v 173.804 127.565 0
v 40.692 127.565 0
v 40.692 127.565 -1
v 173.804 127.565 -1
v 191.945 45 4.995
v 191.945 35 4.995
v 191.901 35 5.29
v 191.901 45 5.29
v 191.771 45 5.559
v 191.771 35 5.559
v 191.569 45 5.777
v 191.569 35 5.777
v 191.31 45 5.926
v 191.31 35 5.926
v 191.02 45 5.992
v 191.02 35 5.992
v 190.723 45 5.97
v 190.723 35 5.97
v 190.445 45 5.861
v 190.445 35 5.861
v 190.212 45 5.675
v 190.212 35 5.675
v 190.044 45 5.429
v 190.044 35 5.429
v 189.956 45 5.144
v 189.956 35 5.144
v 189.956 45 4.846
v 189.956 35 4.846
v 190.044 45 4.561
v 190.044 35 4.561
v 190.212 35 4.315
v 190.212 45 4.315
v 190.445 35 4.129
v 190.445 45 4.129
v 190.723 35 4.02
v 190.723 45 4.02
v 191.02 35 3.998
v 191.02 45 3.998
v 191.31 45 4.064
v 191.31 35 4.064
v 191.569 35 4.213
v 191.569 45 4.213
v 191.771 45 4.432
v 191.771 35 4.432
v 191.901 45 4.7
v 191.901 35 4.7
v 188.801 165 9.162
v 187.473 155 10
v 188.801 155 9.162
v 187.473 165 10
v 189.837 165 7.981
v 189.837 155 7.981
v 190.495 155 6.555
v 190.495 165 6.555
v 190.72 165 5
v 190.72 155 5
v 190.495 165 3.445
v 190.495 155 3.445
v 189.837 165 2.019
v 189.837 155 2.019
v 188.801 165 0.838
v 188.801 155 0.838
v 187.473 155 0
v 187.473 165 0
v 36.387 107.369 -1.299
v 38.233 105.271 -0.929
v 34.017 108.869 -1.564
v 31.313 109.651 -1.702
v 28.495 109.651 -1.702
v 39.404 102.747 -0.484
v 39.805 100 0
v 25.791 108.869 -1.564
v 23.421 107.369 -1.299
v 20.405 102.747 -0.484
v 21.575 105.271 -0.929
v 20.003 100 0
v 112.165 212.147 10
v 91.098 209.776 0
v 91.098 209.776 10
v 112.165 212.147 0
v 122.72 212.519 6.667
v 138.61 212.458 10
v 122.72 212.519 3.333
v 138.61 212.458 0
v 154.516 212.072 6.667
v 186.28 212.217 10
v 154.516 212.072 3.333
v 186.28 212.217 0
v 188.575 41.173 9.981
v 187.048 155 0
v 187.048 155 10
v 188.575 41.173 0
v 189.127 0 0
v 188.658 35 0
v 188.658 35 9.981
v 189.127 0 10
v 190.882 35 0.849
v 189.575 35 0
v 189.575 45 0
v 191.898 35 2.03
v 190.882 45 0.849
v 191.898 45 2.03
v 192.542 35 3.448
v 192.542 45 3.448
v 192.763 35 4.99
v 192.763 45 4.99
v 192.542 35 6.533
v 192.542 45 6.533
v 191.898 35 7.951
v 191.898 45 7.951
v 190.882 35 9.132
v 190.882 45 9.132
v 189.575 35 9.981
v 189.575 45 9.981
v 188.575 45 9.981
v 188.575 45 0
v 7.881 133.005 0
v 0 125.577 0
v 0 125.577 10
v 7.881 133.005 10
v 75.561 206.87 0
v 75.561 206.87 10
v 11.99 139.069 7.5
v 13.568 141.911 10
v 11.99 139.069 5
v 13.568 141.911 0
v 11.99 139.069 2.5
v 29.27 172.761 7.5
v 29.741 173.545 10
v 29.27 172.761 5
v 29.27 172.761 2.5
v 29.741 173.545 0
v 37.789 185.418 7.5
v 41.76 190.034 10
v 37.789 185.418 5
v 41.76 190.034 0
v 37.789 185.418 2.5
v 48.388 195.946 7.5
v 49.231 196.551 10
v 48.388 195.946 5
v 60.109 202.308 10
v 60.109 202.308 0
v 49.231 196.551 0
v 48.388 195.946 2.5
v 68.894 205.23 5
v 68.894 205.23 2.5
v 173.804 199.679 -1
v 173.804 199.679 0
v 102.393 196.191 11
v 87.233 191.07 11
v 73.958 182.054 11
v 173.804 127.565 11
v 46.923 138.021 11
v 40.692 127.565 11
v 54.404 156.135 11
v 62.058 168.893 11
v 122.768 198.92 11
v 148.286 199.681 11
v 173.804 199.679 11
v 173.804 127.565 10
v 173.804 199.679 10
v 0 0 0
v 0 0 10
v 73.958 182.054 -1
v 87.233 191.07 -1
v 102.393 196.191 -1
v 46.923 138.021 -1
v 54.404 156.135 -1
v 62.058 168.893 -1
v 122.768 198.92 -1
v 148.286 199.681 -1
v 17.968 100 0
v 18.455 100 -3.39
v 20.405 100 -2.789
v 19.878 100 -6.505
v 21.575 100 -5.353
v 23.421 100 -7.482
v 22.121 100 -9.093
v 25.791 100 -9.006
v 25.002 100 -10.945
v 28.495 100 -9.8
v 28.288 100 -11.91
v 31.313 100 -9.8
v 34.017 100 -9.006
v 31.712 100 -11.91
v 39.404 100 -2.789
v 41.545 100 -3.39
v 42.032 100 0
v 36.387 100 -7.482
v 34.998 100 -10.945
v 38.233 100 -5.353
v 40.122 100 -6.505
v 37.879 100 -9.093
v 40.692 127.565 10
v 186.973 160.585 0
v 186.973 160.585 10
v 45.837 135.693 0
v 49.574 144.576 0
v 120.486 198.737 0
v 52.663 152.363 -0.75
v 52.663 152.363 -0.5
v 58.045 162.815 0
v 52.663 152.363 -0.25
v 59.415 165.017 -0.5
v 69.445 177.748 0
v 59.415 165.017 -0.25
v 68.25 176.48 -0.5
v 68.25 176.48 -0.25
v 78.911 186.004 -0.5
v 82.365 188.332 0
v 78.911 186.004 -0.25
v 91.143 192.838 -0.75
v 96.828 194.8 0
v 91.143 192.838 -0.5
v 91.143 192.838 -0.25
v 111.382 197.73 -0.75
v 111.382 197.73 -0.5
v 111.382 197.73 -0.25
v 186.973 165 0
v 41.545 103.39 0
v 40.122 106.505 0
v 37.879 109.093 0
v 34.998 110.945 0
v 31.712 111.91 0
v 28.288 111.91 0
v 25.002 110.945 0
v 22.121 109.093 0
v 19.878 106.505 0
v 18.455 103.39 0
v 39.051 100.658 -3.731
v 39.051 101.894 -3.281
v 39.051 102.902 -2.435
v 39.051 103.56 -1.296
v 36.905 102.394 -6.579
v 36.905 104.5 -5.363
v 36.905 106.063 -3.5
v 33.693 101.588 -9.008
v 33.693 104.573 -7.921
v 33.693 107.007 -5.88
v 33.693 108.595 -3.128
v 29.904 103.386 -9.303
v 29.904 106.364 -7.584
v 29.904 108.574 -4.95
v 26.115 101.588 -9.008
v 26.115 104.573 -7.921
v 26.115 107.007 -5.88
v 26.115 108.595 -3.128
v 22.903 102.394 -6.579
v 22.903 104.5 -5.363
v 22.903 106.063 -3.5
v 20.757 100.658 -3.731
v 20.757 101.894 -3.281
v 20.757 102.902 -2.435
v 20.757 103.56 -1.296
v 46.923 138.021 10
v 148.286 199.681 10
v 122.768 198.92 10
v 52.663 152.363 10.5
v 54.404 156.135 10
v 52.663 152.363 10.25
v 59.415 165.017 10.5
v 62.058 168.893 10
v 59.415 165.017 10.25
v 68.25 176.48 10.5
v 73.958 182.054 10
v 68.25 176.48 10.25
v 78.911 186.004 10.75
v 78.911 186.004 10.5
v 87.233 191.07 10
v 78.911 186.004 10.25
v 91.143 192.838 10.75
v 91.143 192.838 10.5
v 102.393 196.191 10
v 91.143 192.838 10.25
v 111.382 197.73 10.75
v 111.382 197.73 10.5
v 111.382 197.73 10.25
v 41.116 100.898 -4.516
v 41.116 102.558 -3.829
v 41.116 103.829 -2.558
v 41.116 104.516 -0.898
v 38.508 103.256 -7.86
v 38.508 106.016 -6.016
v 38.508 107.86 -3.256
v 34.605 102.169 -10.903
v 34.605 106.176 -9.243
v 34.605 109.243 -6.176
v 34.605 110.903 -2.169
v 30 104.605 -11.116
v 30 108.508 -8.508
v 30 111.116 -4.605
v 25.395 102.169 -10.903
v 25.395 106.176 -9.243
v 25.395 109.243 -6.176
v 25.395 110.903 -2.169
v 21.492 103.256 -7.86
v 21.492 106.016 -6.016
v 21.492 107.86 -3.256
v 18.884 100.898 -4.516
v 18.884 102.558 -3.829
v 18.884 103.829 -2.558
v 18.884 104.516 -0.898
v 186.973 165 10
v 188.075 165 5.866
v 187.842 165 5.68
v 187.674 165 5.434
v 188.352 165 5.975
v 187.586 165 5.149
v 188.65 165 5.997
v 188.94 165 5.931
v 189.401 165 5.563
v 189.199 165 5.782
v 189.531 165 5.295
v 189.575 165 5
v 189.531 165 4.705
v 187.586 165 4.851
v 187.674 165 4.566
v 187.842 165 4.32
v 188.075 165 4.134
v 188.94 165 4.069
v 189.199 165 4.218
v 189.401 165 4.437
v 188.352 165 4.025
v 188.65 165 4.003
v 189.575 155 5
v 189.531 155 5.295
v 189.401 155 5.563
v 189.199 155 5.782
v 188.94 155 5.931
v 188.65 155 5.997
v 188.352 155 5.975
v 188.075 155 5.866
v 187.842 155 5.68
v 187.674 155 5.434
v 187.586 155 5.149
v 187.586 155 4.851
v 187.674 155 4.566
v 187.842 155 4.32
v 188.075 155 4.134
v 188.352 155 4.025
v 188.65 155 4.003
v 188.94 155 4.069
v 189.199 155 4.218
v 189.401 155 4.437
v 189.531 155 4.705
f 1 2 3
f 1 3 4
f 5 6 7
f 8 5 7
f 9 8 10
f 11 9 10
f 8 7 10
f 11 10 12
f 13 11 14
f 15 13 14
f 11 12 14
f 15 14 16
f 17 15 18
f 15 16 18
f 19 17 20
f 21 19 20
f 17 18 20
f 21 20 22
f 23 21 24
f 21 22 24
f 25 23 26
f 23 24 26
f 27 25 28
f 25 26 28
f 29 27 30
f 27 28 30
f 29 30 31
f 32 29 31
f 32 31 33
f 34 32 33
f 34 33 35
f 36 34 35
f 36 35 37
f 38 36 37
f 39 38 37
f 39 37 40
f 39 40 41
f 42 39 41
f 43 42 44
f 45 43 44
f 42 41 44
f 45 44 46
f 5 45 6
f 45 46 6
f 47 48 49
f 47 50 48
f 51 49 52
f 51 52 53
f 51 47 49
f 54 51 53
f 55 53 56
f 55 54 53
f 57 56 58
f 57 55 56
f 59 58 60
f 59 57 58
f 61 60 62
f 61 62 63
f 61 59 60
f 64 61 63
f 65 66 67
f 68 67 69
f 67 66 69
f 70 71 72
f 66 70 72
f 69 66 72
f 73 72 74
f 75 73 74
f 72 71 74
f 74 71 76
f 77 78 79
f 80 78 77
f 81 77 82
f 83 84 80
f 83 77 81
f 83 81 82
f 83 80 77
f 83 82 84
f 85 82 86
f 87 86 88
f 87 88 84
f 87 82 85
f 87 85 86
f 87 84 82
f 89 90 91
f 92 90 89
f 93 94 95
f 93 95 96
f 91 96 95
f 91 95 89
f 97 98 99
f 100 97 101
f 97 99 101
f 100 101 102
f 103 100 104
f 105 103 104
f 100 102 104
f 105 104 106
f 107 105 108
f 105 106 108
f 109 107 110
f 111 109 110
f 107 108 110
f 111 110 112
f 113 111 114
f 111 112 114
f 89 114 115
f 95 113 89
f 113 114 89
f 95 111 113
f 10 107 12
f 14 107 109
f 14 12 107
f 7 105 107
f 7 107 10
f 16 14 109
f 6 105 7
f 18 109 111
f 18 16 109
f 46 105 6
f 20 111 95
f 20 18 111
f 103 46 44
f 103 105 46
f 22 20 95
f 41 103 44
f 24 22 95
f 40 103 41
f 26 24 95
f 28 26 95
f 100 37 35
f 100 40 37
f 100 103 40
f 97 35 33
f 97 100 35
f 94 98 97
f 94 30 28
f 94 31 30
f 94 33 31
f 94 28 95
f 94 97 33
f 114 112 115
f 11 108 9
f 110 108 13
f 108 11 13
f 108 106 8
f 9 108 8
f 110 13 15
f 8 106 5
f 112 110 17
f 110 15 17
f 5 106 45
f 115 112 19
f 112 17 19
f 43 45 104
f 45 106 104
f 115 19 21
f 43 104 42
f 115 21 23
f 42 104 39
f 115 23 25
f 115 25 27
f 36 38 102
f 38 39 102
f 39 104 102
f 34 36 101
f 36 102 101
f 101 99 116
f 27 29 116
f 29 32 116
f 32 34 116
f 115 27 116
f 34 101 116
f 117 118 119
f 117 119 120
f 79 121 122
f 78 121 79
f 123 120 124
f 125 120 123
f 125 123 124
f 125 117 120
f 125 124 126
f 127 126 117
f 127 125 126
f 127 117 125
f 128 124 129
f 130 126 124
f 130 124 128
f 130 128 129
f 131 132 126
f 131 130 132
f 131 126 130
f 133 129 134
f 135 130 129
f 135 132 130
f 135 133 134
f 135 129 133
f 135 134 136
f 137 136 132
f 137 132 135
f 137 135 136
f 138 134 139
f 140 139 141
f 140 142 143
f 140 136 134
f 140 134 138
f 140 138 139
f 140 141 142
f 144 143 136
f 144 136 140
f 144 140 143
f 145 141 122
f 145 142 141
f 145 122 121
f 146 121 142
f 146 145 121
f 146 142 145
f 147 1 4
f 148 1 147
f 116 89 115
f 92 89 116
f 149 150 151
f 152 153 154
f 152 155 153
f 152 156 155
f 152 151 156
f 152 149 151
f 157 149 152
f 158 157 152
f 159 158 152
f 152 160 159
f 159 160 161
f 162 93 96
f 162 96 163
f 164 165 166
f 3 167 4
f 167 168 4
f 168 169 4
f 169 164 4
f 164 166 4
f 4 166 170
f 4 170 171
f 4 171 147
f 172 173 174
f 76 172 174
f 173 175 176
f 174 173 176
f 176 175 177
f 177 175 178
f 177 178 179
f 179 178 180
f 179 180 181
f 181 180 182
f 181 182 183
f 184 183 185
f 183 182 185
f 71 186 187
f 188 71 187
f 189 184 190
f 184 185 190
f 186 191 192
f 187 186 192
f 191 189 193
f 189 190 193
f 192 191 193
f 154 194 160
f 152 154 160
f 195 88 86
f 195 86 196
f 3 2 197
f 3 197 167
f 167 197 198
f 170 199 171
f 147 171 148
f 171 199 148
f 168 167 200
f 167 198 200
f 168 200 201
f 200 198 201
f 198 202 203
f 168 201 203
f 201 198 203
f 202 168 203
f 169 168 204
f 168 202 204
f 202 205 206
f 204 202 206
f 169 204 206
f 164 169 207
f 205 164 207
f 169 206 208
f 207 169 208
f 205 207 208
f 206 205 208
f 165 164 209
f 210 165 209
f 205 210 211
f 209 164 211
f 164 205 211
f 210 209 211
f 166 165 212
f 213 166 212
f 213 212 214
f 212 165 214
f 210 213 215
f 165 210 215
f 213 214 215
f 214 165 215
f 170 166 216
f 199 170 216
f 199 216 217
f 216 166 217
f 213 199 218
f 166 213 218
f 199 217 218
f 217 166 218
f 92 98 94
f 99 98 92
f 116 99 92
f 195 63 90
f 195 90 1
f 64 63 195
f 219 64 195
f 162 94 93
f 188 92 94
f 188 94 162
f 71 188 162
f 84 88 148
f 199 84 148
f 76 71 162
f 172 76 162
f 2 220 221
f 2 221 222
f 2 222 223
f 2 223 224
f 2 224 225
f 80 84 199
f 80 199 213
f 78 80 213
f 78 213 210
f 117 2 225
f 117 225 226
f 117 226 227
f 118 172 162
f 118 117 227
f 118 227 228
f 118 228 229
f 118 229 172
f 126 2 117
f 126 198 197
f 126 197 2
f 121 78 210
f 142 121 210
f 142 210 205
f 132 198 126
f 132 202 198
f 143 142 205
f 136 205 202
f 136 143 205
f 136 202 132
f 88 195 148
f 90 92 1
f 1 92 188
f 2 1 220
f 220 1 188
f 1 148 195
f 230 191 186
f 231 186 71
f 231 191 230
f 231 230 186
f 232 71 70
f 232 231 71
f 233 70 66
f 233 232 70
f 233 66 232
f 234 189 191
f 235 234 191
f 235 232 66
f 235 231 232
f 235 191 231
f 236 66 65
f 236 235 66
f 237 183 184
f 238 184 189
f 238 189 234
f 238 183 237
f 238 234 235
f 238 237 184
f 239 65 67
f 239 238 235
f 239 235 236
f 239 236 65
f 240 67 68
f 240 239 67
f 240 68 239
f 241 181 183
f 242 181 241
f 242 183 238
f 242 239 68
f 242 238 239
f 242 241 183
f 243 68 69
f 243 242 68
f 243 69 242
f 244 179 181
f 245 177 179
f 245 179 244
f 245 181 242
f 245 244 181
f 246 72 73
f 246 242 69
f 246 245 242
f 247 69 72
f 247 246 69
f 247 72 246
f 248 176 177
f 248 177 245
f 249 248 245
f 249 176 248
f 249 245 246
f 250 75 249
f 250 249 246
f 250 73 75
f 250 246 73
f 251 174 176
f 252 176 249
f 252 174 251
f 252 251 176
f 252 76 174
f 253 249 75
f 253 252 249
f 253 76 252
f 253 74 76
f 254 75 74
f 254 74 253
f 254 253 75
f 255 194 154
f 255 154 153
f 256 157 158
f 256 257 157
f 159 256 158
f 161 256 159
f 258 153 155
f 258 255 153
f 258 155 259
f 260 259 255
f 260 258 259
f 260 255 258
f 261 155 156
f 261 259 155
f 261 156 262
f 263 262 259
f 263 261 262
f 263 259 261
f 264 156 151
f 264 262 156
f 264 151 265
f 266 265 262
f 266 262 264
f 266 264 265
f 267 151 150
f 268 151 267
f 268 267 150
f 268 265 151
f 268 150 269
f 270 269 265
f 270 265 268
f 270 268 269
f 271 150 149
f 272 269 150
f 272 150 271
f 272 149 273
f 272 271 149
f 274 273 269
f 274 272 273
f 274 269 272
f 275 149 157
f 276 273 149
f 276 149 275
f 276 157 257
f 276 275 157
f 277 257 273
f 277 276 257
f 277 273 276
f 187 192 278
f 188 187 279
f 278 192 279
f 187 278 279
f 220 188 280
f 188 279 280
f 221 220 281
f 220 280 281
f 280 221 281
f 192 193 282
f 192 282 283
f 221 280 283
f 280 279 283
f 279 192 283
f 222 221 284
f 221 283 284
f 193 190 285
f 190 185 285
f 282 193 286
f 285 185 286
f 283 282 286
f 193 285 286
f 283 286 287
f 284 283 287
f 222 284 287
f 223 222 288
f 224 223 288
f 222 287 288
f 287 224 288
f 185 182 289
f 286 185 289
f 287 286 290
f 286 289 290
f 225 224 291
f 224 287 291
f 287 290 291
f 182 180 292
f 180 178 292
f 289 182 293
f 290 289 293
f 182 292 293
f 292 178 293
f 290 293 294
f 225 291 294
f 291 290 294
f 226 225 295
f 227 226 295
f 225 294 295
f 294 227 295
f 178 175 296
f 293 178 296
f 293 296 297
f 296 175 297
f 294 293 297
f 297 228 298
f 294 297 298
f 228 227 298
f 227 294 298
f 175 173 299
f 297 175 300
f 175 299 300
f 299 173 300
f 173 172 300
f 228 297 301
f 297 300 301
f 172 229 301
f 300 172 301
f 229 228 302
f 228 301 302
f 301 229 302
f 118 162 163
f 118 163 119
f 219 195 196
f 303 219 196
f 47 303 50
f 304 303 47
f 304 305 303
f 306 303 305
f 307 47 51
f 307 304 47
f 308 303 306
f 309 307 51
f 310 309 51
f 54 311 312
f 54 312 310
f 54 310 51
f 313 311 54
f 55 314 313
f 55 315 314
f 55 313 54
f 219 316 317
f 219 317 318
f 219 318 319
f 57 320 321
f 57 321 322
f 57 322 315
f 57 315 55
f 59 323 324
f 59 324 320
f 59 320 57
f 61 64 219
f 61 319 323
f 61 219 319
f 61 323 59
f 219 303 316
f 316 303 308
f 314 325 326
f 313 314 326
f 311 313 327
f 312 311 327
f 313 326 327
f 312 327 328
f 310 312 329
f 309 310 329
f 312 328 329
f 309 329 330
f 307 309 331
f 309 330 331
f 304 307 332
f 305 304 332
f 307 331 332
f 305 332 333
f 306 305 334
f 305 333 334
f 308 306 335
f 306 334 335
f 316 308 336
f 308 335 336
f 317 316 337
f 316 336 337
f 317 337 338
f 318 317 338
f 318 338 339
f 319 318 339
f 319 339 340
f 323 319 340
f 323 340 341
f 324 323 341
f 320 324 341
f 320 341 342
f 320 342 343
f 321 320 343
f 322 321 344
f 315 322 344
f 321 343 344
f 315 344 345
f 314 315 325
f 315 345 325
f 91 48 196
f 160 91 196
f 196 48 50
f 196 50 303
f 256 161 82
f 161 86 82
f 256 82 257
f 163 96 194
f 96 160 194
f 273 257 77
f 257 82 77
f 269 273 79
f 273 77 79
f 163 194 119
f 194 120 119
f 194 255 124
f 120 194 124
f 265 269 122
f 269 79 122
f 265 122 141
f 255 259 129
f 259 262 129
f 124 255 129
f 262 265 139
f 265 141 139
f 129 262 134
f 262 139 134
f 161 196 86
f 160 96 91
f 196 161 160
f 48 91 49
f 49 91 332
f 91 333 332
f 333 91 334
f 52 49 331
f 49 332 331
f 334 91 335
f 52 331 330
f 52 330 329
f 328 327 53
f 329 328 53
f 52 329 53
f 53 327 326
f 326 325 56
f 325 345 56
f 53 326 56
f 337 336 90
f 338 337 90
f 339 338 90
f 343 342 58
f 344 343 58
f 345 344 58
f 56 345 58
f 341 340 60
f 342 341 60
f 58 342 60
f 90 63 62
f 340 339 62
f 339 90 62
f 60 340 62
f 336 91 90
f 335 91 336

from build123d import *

# Parameters (mm, degrees)
BOSS_EXTRUDE1_DEPTH      = 10
BOSS_EXTRUDE2_DEPTH      = 1
BOSS_EXTRUDE2_DEPTH_BACK = 11
BOSS_EXTRUDE3_DEPTH      = 5
BOSS_EXTRUDE3_DEPTH_BACK = 5
BOSS_EXTRUDE4_DEPTH      = 5
BOSS_EXTRUDE4_DEPTH_BACK = 5
SKETCH19_R               = 1
CUT_EXTRUDE3_DEPTH       = 10
SKETCH24_R               = 1
CUT_EXTRUDE4_DEPTH       = 10
REVOLVE2_ANGLE           = 90
CUT_REVOLVE4_ANGLE       = 80


with BuildPart() as part:
    # Sketch1 → Boss-Extrude1 (new body)
    with BuildSketch(Plane.XY):
        with BuildLine():
            Line((186.280110435, 212.216863761), (189.127439812, 0))
            Line((189.127439812, 0), (0, 0))
            Line((0, 0), (0, 125.576698411))
            add(Edge.make_bspline(
                [(0, 125.576698411), (10.557001905, 132.837635912), (17.098165485, 150.751131911), (30.538510921, 175.76338894), (49.352217031, 203.04075133), (76.867896029, 207.296992896), (91.097956951, 209.776295723)],
                knots=[0, 0, 0, 0, 0.275246051, 0.426571591, 0.655828837, 1, 1, 1, 1], degree=3))
            add(Edge.make_bspline(
                [(91.097956951, 209.776295723), (122.565116695, 215.374757588), (154.60100966, 210.515513687), (186.280110435, 212.216863761)],
                knots=[0, 0, 0, 0, 1, 1, 1, 1], degree=3))
        make_face()
    extrude(amount=BOSS_EXTRUDE1_DEPTH)

    # Sketch3 → Boss-Extrude2 (add, two sides: drawn at the far end of the back side and taken through both)
    with BuildSketch(Plane.XY.offset(10).offset(-BOSS_EXTRUDE2_DEPTH_BACK)):
        with BuildLine():
            Line((40.691917073, 127.565231362), (173.80372619, 127.565231362))
            Line((173.80372619, 127.565231362), (173.80372619, 199.679337801))
            add(Edge.make_bspline(
                [(40.691917073, 127.565231362), (46.771290341, 134.933306827), (53.369134393, 161.704453989), (78.457507643, 191.212262771), (124.31750344, 201.038762955), (152.264868916, 199.362802741), (173.80372619, 199.679337801)],
                knots=[0, 0, 0, 0, 0.16561761, 0.500501685, 0.611599227, 1, 1, 1, 1], degree=3))
        make_face()
    extrude(amount=BOSS_EXTRUDE2_DEPTH + BOSS_EXTRUDE2_DEPTH_BACK)

    # Sketch17 → Boss-Extrude3 (add, two sides: drawn at the far end of the back side and taken through both)
    with BuildSketch(Plane(origin=(0, 40, 0), x_dir=(-1, 0, 0), z_dir=(0, -1, 0)).offset(-BOSS_EXTRUDE3_DEPTH_BACK)):
        with BuildLine():
            Line((-188.57501815, 0), (-189.57501815, 0))
            ThreePointArc((-189.57501815, 0), (-192.762810227, -4.99036016), (-189.57501815, -9.98072032))
            Line((-189.57501815, -9.98072032), (-188.57501815, -9.98072032))
            Line((-188.57501815, -9.98072032), (-188.57501815, 0))
        make_face()
    extrude(amount=BOSS_EXTRUDE3_DEPTH + BOSS_EXTRUDE3_DEPTH_BACK)

    # Sketch18 → Boss-Extrude4 (add, two sides: drawn at the far end of the back side and taken through both)
    with BuildSketch(Plane(origin=(0, 160, 0), x_dir=(-1, 0, 0), z_dir=(0, -1, 0)).offset(-BOSS_EXTRUDE4_DEPTH_BACK)):
        with BuildLine():
            Line((-186.972854644, -10), (-187.472854644, -10))
            ThreePointArc((-187.472854644, -10), (-190.720096746, -5), (-187.472854644, 0))
            Line((-187.472854644, 0), (-186.972854644, 0))
            Line((-186.972854644, 0), (-186.972854644, -10))
        make_face()
    extrude(amount=BOSS_EXTRUDE4_DEPTH + BOSS_EXTRUDE4_DEPTH_BACK)

    # Sketch19 → Cut-Extrude3 (cut)
    with BuildSketch(Plane.XZ.offset(-155)):
        with Locations((188.57501815, 5)):
            Circle(SKETCH19_R)
    extrude(amount=-CUT_EXTRUDE3_DEPTH, mode=Mode.SUBTRACT)

    # Sketch24 → Cut-Extrude4 (cut)
    with BuildSketch(Plane.XZ.offset(-35)):
        with Locations((190.94512502, 4.99518008)):
            Circle(SKETCH24_R)
    extrude(amount=-CUT_EXTRUDE4_DEPTH, mode=Mode.SUBTRACT)

    # Sketch30 → Revolve2 (revolve)
    with BuildSketch(Plane(origin=(0, 100, 0), x_dir=(1, 0, 0), z_dir=(0, 1, 0))):
        with BuildLine():
            Line((17.967687334, 0), (42.032312666, 0))
            ThreePointArc((42.032312666, 0), (30, 12.032312666), (17.967687334, 0))
        make_face()
    revolve(axis=Axis((17.967687334, 100, 0), (1, 0, 0)), revolution_arc=REVOLVE2_ANGLE)

    # Sketch31 → Cut-Revolve4 (revolve, cut)
    with BuildSketch(Plane.XZ.offset(-100)):
        with BuildLine():
            Line((20.003479707, 0), (39.804560833, 0))
            ThreePointArc((39.804560833, 0), (29.90402027, -9.900540563), (20.003479707, 0))
        make_face()
    revolve(axis=Axis((20.003479707, 100, 0), (1, 0, 0)), revolution_arc=CUT_REVOLVE4_ANGLE, mode=Mode.SUBTRACT)


solid = part.part
